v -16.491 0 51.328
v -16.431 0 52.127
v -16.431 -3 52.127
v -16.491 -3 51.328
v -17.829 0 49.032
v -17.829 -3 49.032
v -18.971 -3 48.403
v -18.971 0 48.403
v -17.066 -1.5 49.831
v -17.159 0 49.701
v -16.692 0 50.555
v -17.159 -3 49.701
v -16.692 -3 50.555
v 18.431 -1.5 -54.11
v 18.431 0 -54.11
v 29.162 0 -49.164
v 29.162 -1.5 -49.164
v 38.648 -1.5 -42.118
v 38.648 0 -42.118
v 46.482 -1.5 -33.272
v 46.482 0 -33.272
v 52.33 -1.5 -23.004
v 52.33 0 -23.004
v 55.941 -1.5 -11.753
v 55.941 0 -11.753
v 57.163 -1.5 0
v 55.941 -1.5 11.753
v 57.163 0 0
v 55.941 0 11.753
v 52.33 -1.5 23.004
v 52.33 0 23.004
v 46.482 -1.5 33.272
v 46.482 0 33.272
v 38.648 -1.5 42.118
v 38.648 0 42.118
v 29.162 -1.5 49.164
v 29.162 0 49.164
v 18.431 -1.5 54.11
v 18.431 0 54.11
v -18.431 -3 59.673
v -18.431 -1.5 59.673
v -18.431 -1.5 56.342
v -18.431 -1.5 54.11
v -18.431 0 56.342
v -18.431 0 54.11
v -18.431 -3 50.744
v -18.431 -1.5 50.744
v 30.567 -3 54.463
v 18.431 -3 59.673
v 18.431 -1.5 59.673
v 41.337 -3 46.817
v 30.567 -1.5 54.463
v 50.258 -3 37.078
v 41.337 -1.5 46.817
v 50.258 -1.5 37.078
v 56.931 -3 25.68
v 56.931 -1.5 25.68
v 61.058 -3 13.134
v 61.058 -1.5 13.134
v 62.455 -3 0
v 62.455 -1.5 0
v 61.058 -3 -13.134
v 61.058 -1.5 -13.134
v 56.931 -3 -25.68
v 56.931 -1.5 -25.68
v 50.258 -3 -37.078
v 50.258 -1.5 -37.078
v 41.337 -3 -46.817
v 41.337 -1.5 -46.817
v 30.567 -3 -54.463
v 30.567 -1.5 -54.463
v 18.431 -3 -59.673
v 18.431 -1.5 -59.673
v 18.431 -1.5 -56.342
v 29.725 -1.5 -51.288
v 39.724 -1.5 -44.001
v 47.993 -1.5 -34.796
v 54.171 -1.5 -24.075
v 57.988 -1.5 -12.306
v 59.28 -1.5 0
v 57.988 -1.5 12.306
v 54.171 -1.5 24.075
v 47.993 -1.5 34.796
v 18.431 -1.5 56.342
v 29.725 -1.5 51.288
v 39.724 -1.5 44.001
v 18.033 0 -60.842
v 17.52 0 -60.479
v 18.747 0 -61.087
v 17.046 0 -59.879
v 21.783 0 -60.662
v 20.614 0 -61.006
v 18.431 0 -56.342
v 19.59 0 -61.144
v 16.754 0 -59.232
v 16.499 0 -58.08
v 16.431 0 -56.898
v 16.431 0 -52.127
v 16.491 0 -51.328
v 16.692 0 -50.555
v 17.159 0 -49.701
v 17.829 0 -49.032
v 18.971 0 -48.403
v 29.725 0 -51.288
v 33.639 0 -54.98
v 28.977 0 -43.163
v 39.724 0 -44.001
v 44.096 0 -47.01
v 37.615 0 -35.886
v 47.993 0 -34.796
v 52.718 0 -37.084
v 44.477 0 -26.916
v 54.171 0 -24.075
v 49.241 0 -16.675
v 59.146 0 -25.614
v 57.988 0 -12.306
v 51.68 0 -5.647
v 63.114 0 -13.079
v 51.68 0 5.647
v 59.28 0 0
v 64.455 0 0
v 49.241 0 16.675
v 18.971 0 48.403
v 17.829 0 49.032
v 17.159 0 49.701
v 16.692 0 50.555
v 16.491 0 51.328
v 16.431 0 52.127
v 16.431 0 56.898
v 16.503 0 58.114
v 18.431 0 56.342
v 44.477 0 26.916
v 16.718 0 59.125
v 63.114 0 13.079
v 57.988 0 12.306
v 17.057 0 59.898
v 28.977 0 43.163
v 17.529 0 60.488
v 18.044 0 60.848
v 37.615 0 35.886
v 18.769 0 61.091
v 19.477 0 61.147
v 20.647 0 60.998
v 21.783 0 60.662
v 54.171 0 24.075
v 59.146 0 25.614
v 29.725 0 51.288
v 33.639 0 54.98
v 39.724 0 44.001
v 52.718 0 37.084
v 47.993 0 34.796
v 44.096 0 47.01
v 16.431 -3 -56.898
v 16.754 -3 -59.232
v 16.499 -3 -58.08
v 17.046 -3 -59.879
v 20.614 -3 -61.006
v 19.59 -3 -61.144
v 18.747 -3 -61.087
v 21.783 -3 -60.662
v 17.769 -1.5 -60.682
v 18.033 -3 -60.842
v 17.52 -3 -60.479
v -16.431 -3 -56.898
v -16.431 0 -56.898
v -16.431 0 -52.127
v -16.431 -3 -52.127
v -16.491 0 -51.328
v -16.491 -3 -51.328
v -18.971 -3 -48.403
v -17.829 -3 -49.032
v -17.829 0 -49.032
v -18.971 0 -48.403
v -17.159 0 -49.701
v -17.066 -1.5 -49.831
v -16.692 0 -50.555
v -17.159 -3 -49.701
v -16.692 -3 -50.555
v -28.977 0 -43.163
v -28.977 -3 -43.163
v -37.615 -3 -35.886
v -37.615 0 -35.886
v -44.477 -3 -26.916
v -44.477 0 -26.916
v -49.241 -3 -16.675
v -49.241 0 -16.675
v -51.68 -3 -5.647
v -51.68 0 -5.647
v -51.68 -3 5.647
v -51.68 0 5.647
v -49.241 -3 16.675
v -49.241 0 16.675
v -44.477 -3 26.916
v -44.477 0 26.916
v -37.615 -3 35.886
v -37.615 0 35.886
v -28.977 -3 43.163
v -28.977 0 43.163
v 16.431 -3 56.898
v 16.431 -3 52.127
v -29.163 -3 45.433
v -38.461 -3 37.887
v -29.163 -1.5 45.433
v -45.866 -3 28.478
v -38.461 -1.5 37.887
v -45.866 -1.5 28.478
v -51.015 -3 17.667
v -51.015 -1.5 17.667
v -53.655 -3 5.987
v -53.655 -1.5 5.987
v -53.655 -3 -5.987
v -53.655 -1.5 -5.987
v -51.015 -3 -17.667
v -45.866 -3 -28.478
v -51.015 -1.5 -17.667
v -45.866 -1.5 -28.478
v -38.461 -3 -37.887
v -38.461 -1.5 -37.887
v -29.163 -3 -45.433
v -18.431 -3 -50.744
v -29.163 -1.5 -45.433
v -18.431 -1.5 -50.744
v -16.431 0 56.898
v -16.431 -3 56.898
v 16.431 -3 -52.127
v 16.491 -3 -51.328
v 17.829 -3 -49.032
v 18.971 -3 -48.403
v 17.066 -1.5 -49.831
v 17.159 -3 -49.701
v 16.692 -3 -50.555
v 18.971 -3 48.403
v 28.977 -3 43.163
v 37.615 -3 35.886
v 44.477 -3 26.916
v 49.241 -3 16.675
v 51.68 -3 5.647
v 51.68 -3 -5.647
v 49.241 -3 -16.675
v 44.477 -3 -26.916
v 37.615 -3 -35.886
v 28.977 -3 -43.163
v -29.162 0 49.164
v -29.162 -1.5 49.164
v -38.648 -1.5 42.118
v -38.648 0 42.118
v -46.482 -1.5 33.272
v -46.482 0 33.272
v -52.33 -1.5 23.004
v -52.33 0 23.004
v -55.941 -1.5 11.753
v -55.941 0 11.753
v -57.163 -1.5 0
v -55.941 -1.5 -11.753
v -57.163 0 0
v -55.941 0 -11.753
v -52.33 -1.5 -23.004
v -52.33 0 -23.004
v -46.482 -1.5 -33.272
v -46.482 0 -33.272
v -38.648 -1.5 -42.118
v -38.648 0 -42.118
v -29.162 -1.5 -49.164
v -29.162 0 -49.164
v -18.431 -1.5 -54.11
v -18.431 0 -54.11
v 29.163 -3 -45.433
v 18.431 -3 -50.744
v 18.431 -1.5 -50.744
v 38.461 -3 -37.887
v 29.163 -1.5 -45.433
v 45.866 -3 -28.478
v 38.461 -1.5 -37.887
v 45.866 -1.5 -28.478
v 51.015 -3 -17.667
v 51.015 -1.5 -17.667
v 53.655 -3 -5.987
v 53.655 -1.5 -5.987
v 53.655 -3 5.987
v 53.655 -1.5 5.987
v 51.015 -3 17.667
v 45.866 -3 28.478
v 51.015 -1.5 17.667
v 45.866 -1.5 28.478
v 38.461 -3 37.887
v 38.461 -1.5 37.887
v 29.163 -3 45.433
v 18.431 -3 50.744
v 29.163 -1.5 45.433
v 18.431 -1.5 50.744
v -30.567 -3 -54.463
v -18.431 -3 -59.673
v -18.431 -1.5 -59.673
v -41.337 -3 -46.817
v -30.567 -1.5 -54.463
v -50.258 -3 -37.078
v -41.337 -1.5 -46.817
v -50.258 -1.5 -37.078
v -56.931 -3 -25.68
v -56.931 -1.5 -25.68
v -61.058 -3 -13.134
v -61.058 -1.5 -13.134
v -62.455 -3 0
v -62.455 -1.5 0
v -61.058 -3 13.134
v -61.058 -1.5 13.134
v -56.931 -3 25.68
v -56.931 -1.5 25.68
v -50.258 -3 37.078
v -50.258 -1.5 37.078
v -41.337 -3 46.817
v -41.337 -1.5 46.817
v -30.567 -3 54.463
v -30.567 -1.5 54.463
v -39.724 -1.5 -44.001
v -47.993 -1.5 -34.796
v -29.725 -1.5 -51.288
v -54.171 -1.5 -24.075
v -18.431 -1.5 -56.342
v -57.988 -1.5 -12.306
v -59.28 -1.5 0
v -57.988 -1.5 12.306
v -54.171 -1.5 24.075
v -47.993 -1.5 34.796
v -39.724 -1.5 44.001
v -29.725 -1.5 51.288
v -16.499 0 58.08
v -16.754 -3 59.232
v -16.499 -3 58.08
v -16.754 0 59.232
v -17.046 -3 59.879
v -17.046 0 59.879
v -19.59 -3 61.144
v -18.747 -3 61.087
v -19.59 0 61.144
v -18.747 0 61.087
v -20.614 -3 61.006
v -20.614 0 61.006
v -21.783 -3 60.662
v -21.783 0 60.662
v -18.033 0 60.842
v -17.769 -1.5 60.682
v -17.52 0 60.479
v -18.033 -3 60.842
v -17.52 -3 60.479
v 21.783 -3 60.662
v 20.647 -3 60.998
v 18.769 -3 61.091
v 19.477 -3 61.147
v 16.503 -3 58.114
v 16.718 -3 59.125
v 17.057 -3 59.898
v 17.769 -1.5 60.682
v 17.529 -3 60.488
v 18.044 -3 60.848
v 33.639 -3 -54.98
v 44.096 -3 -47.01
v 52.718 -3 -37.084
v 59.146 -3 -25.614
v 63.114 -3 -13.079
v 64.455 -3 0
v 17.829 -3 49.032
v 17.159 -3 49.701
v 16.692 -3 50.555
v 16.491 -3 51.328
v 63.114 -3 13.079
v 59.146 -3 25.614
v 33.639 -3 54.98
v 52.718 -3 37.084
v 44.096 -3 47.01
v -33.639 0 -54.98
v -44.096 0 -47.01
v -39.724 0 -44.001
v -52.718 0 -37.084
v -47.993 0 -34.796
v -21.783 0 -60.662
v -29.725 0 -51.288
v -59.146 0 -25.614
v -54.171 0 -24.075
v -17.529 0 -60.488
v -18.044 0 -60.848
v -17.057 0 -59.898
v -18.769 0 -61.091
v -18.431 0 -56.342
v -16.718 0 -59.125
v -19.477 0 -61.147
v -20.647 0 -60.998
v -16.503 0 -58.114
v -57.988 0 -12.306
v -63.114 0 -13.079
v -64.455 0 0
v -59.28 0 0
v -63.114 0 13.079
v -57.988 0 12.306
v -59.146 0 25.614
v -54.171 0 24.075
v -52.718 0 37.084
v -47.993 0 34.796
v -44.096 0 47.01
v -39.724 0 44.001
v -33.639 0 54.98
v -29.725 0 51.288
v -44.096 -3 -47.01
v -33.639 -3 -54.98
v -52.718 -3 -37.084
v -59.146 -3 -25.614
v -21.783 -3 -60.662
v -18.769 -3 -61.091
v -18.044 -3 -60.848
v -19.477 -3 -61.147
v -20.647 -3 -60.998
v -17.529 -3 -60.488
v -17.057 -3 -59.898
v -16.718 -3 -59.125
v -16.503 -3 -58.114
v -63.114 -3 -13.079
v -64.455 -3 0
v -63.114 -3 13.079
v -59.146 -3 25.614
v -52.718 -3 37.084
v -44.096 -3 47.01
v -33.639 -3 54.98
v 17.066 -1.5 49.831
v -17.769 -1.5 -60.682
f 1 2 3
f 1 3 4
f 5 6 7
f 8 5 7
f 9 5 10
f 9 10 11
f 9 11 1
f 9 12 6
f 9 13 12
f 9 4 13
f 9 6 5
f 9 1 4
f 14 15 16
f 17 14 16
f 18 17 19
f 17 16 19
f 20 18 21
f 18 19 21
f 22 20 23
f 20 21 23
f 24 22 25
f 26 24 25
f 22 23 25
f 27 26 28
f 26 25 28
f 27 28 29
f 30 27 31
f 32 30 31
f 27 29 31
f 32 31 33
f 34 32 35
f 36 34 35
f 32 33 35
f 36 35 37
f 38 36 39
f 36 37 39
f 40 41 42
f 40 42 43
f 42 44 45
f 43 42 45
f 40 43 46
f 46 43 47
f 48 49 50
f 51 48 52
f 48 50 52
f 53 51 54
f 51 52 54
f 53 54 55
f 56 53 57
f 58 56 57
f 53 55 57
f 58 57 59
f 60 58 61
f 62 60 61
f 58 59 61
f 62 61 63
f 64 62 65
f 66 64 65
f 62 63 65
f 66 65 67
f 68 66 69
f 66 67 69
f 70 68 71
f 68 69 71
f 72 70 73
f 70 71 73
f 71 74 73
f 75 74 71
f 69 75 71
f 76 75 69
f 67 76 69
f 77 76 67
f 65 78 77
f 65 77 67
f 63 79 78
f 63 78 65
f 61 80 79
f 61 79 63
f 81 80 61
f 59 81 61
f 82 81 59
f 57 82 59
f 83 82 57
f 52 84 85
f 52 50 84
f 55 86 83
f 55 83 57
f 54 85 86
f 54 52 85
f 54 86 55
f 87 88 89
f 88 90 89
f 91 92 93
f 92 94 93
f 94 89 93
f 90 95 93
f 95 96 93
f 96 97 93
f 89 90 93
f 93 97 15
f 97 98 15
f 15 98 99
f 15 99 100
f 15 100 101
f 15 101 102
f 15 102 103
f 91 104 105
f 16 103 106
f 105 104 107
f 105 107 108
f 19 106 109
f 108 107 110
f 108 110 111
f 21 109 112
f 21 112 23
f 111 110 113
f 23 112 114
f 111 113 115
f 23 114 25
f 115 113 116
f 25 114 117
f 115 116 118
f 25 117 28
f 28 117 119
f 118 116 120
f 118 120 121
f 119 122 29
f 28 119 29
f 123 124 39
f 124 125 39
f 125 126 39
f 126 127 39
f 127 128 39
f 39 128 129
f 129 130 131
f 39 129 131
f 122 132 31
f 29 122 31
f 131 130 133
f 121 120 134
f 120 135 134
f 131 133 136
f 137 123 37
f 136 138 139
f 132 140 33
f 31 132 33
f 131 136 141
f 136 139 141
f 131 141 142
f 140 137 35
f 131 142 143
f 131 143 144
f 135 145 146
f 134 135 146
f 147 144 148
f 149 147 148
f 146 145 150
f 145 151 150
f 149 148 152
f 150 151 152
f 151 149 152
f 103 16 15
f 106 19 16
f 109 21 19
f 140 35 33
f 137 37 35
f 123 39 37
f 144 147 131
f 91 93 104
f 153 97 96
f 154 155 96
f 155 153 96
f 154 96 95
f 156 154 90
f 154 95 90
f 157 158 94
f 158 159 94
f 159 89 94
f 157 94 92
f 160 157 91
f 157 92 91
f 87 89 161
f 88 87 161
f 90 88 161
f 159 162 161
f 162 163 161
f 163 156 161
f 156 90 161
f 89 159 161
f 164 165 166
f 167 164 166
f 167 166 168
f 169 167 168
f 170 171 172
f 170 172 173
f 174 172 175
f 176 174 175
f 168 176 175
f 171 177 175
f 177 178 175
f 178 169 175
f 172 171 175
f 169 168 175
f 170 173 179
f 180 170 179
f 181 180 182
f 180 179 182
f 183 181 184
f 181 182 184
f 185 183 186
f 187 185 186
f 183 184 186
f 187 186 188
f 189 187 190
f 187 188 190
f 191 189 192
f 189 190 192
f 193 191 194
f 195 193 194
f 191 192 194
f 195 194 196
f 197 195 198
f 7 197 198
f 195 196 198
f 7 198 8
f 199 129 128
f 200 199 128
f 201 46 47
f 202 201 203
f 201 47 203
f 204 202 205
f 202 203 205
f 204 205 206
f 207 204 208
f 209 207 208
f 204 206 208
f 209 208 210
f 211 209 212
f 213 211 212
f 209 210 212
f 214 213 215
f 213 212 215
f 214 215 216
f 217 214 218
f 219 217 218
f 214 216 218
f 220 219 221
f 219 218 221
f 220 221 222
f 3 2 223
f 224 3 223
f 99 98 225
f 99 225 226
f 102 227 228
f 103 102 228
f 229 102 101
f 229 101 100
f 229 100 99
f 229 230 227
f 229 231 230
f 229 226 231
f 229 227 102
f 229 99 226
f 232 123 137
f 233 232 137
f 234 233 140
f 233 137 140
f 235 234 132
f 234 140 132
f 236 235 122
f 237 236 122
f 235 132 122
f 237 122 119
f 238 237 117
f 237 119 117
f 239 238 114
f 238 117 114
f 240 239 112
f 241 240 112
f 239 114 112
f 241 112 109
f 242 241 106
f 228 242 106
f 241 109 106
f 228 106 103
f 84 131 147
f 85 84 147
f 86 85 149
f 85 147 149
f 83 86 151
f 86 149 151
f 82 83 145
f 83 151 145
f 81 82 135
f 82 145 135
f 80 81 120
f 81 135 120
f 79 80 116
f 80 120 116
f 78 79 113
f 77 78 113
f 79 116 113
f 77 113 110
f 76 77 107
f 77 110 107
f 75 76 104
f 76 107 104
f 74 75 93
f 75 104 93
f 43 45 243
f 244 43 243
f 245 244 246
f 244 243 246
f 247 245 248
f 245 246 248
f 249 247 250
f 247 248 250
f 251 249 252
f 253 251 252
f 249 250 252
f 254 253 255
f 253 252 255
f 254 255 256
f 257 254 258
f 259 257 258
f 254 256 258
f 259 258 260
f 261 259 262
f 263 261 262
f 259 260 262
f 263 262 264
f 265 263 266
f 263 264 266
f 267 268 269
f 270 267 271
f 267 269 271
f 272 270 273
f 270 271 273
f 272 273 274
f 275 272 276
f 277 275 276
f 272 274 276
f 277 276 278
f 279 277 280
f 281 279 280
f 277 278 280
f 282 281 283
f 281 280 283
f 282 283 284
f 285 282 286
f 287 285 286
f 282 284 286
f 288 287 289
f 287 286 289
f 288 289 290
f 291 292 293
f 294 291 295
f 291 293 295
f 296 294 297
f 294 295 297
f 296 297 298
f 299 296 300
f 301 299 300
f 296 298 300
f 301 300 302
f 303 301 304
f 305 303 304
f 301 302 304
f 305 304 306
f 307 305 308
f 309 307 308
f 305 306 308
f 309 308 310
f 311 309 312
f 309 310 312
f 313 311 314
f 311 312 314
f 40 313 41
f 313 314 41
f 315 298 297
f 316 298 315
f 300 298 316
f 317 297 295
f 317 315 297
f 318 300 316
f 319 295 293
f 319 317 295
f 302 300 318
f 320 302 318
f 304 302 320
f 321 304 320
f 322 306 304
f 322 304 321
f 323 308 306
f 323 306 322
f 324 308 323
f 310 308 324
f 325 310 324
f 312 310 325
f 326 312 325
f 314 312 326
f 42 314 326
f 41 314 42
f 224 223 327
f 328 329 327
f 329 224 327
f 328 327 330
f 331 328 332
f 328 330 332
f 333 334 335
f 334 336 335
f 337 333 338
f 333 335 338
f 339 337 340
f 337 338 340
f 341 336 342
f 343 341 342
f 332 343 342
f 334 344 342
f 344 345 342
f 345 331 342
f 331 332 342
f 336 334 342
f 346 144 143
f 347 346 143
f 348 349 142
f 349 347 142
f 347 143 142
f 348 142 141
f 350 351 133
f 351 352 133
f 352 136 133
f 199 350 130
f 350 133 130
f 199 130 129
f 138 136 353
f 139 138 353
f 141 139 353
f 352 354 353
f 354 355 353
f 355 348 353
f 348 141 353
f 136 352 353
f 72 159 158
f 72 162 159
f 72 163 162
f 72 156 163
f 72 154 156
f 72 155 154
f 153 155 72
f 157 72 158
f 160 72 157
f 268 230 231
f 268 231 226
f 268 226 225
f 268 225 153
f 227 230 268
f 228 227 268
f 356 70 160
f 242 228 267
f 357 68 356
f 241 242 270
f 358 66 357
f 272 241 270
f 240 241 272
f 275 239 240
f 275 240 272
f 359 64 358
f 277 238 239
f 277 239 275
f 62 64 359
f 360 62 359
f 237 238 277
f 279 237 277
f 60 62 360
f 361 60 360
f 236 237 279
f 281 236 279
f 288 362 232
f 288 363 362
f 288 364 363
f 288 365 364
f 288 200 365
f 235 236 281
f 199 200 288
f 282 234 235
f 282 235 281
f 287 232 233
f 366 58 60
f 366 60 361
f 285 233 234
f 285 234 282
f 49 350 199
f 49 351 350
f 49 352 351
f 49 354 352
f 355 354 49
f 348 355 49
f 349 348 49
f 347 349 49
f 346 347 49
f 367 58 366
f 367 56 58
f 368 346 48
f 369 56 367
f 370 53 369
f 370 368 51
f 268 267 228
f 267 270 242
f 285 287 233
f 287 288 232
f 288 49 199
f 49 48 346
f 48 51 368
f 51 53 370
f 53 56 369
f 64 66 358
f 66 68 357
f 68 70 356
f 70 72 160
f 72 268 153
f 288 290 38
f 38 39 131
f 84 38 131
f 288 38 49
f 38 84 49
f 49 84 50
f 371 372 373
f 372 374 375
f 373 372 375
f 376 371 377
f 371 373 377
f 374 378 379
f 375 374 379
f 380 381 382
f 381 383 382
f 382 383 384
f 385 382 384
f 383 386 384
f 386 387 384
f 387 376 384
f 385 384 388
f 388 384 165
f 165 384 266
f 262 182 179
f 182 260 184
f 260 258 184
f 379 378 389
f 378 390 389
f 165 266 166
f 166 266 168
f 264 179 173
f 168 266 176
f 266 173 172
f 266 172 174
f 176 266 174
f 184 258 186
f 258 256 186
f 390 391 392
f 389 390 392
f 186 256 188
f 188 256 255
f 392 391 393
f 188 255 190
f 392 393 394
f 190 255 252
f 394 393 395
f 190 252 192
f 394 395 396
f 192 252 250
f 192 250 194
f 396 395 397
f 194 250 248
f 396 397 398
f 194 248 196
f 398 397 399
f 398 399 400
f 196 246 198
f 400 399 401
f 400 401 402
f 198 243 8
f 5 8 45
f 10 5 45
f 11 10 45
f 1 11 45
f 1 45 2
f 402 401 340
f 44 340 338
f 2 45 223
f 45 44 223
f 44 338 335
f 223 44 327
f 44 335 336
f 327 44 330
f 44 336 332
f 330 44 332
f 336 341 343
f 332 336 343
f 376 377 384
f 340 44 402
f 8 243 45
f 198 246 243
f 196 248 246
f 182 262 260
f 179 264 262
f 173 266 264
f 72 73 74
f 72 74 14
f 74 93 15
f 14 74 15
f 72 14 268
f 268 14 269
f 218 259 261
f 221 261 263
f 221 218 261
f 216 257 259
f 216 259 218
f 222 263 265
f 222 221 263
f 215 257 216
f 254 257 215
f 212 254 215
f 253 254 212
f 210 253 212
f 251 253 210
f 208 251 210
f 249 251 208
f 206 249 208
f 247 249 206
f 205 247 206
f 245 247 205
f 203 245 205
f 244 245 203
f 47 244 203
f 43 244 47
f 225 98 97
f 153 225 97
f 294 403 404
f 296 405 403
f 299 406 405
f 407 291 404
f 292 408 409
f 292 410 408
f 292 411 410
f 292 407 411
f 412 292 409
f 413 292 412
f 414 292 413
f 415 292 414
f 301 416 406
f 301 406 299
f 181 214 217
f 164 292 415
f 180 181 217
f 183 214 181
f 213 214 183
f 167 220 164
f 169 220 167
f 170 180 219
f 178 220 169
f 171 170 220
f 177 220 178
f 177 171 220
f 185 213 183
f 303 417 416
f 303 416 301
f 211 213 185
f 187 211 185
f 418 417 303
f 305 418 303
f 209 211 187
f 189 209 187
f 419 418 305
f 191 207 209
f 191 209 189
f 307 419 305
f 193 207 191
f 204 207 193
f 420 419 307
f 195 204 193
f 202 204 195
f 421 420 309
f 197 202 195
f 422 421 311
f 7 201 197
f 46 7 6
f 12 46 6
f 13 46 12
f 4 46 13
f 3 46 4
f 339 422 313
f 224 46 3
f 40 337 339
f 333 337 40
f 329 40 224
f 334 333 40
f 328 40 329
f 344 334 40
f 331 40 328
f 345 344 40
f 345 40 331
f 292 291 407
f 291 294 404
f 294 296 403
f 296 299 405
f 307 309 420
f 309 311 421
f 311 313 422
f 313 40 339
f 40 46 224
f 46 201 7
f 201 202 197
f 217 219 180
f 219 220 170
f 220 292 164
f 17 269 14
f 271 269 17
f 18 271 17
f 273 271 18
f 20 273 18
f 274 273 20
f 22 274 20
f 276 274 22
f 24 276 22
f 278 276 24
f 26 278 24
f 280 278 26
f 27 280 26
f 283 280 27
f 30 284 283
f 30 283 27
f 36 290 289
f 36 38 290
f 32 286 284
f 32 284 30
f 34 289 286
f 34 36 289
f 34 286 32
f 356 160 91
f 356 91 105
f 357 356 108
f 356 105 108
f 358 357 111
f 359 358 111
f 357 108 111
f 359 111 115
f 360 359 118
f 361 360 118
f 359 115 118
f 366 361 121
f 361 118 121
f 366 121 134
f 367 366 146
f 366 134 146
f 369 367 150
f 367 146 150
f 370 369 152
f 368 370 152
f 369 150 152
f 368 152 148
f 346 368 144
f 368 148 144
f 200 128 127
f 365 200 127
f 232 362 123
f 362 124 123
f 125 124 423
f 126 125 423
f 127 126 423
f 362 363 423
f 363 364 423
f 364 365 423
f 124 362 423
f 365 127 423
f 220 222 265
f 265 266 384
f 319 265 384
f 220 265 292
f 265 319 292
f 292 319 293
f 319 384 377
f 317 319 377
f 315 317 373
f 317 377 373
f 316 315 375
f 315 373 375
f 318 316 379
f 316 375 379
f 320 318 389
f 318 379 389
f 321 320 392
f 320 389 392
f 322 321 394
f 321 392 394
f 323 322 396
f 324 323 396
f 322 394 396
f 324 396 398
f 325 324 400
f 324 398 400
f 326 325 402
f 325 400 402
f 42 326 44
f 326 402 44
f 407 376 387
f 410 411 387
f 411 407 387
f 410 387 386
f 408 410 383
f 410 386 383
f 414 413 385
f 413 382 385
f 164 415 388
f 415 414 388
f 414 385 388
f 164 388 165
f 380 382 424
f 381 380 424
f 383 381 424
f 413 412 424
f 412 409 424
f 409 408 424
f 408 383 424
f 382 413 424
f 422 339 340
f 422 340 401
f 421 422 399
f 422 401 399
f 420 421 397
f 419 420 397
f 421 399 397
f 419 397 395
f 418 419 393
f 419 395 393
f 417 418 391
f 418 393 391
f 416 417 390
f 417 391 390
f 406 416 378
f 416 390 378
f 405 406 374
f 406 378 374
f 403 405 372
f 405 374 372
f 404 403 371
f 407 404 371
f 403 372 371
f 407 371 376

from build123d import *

# Parameters (mm, degrees)
F1_DEPTH      = 1.5
F2_DEPTH      = 3
F3_T1_DEPTH   = 31.0210256648
F3_T3_DEPTH   = 17.0194710076
F3_2_T1_DEPTH = 31.0210256648
F3_2_T3_DEPTH = 17.0194710075


# Not quite as in the source:
# - a fillet or chamfer that OpenCascade refuses, or shapes differently, is made with other operations: its cross-section is extruded or revolved along the edge and cut away or added


with BuildPart() as f1:
    # F0 (on Front) → F1 (new body)
    with BuildSketch(Plane.XZ):
        with BuildLine():
            ThreePointArc((-18.4309218526, 56.3415860789), (-17.4336374643, 56.6581105137), (-16.4309218526, 56.95698385))
            Line((-16.4309218526, 56.95698385), (-16.4309218526, 60.2544953802))
            ThreePointArc((-16.4309218526, 60.2544953802), (-17.433345569, 59.972142439), (-18.4309218526, 59.6731139301))
            Line((-18.4309218526, 59.6731139301), (-18.4309218526, 56.3415860789))
        make_face()
        with BuildLine():
            ThreePointArc((-18.4309218526, -56.3415860789), (-59.2796187759, 0), (-18.4309218526, 56.3415860789))
            Line((-18.4309218526, 56.3415860789), (-18.4309218526, 59.6731139301))
            ThreePointArc((-18.4309218526, 59.6731139301), (-62.4546187759, 0), (-18.4309218526, -59.6731139301))
            Line((-18.4309218526, -59.6731139301), (-18.4309218526, -56.3415860789))
        make_face()
        with BuildLine():
            ThreePointArc((-16.4309218526, -56.95698385), (-17.4336374643, -56.6581105137), (-18.4309218526, -56.3415860789))
            Line((-18.4309218526, -56.3415860789), (-18.4309218526, -59.6731139301))
            ThreePointArc((-18.4309218526, -59.6731139301), (-17.433345569, -59.972142439), (-16.4309218526, -60.2544953802))
            Line((-16.4309218526, -60.2544953802), (-16.4309218526, -56.95698385))
        make_face()
    extrude(amount=F1_DEPTH)



with BuildPart() as f1b:
    # F0 (on Front) → F1, piece 2 (new body)
    with BuildSketch(Plane.XZ):
        with BuildLine():
            ThreePointArc((-18.4309218526, 50.7441040985), (-17.4342611615, 51.0951026895), (-16.4309218526, 51.4265280587))
            Line((-16.4309218526, 51.4265280587), (-16.4309218526, 54.7502492451))
            ThreePointArc((-16.4309218526, 54.7502492451), (-17.4338634076, 54.4391898544), (-18.4309218526, 54.1097597942))
            Line((-18.4309218526, 54.1097597942), (-18.4309218526, 50.7441040985))
        make_face()
        with BuildLine():
            ThreePointArc((-18.4309218526, -50.7441040985), (-53.9876187759, 0), (-18.4309218526, 50.7441040985))
            Line((-18.4309218526, 50.7441040985), (-18.4309218526, 54.1097597942))
            ThreePointArc((-18.4309218526, 54.1097597942), (-57.1626187759, 0), (-18.4309218526, -54.1097597942))
            Line((-18.4309218526, -54.1097597942), (-18.4309218526, -50.7441040985))
        make_face()
        with BuildLine():
            ThreePointArc((-16.4309218526, -51.4265280587), (-17.4342611615, -51.0951026895), (-18.4309218526, -50.7441040985))
            Line((-18.4309218526, -50.7441040985), (-18.4309218526, -54.1097597942))
            ThreePointArc((-18.4309218526, -54.1097597942), (-17.4338634076, -54.4391898544), (-16.4309218526, -54.7502492451))
            Line((-16.4309218526, -54.7502492451), (-16.4309218526, -51.4265280587))
        make_face()
    extrude(amount=F1_DEPTH)


with BuildPart() as f1c:
    # F0 (on Front) → F1, piece 3 (new body)
    with BuildSketch(Plane.XZ):
        with BuildLine():
            ThreePointArc((18.4309218526, -56.3415860789), (17.4336374643, -56.6581105137), (16.4309218526, -56.95698385))
            Line((16.4309218526, -56.95698385), (16.4309218526, -60.2544953802))
            ThreePointArc((16.4309218526, -60.2544953802), (17.433345569, -59.972142439), (18.4309218526, -59.6731139301))
            Line((18.4309218526, -59.6731139301), (18.4309218526, -56.3415860789))
        make_face()
        with BuildLine():
            ThreePointArc((18.4309218526, 56.3415860789), (59.2796187759, 0), (18.4309218526, -56.3415860789))
            Line((18.4309218526, -56.3415860789), (18.4309218526, -59.6731139301))
            ThreePointArc((18.4309218526, -59.6731139301), (62.4546187759, 0), (18.4309218526, 59.6731139301))
            Line((18.4309218526, 59.6731139301), (18.4309218526, 56.3415860789))
        make_face()
        with BuildLine():
            ThreePointArc((16.4309218526, 56.95698385), (17.4336374643, 56.6581105137), (18.4309218526, 56.3415860789))
            Line((18.4309218526, 56.3415860789), (18.4309218526, 59.6731139301))
            ThreePointArc((18.4309218526, 59.6731139301), (17.433345569, 59.972142439), (16.4309218526, 60.2544953802))
            Line((16.4309218526, 60.2544953802), (16.4309218526, 56.95698385))
        make_face()
    extrude(amount=F1_DEPTH)



with BuildPart() as f1d:
    # F0 (on Front) → F1, piece 4 (new body)
    with BuildSketch(Plane.XZ):
        with BuildLine():
            ThreePointArc((18.4309218526, -50.7441040985), (17.4342611615, -51.0951026895), (16.4309218526, -51.4265280587))
            Line((16.4309218526, -51.4265280587), (16.4309218526, -54.7502492451))
            ThreePointArc((16.4309218526, -54.7502492451), (17.4338634076, -54.4391898544), (18.4309218526, -54.1097597942))
            Line((18.4309218526, -54.1097597942), (18.4309218526, -50.7441040985))
        make_face()
        with BuildLine():
            ThreePointArc((18.4309218526, 50.7441040985), (53.9876187759, 0), (18.4309218526, -50.7441040985))
            Line((18.4309218526, -50.7441040985), (18.4309218526, -54.1097597942))
            ThreePointArc((18.4309218526, -54.1097597942), (57.1626187759, 0), (18.4309218526, 54.1097597942))
            Line((18.4309218526, 54.1097597942), (18.4309218526, 50.7441040985))
        make_face()
        with BuildLine():
            ThreePointArc((16.4309218526, 51.4265280587), (17.4342611615, 51.0951026895), (18.4309218526, 50.7441040985))
            Line((18.4309218526, 50.7441040985), (18.4309218526, 54.1097597942))
            ThreePointArc((18.4309218526, 54.1097597942), (17.4338634076, 54.4391898544), (16.4309218526, 54.7502492451))
            Line((16.4309218526, 54.7502492451), (16.4309218526, 51.4265280587))
        make_face()
    extrude(amount=F1_DEPTH)


with BuildPart() as f1_1:
    add(f1.part)

    add(f1b.part)  # F2 merges F1b
    # F0 (on Front) → F2 (join)
    with BuildSketch(Plane.XZ):
        with BuildLine():
            ThreePointArc((-18.4309218526, 59.6731139301), (-17.433345569, 59.972142439), (-16.4309218526, 60.2544953802))
            Line((-16.4309218526, 60.2544953802), (-16.4309218526, 62.3251368921))
            ThreePointArc((-16.4309218526, 62.3251368921), (-17.4331857663, 62.0522514949), (-18.4309218526, 61.7632496005))
            Line((-18.4309218526, 61.7632496005), (-18.4309218526, 59.6731139301))
        make_face()
        with BuildLine():
            ThreePointArc((-18.4309218526, -59.6731139301), (-62.4546187759, 0), (-18.4309218526, 59.6731139301))
            Line((-18.4309218526, 59.6731139301), (-18.4309218526, 61.7632496005))
            ThreePointArc((-18.4309218526, 61.7632496005), (-64.4546187759, 0), (-18.4309218526, -61.7632496005))
            Line((-18.4309218526, -61.7632496005), (-18.4309218526, -59.6731139301))
        make_face()
        with BuildLine():
            ThreePointArc((-16.4309218526, -60.2544953802), (-17.433345569, -59.972142439), (-18.4309218526, -59.6731139301))
            Line((-18.4309218526, -59.6731139301), (-18.4309218526, -61.7632496005))
            ThreePointArc((-18.4309218526, -61.7632496005), (-17.4331857663, -62.0522514949), (-16.4309218526, -62.3251368921))
            Line((-16.4309218526, -62.3251368921), (-16.4309218526, -60.2544953802))
        make_face()
        with BuildLine():
            Line((-16.4309218526, 49.3227869556), (-16.4309218526, 51.4265280587))
            ThreePointArc((-16.4309218526, 51.4265280587), (-17.4342611615, 51.0951026895), (-18.4309218526, 50.7441040985))
            Line((-18.4309218526, 50.7441040985), (-18.4309218526, 48.6108385615))
            ThreePointArc((-18.4309218526, 48.6108385615), (-17.4345563253, 48.9770226916), (-16.4309218526, 49.3227869556))
        make_face()
        with BuildLine():
            Line((-18.4309218526, 48.6108385615), (-18.4309218526, 50.7441040985))
            ThreePointArc((-18.4309218526, 50.7441040985), (-53.9876187759, 0), (-18.4309218526, -50.7441040985))
            Line((-18.4309218526, -50.7441040985), (-18.4309218526, -48.6108385615))
            ThreePointArc((-18.4309218526, -48.6108385615), (-51.9876187759, 0), (-18.4309218526, 48.6108385615))
        make_face()
        with BuildLine():
            Line((-18.4309218526, -48.6108385615), (-18.4309218526, -50.7441040985))
            ThreePointArc((-18.4309218526, -50.7441040985), (-17.4342611615, -51.0951026895), (-16.4309218526, -51.4265280587))
            Line((-16.4309218526, -51.4265280587), (-16.4309218526, -49.3227869556))
            ThreePointArc((-16.4309218526, -49.3227869556), (-17.4345563253, -48.9770226916), (-18.4309218526, -48.6108385615))
        make_face()
        with BuildLine():
            ThreePointArc((-18.4309218526, 54.1097597942), (-17.4338634076, 54.4391898544), (-16.4309218526, 54.7502492451))
            Line((-16.4309218526, 54.7502492451), (-16.4309218526, 56.95698385))
            ThreePointArc((-16.4309218526, 56.95698385), (-17.4336374643, 56.6581105137), (-18.4309218526, 56.3415860789))
            Line((-18.4309218526, 56.3415860789), (-18.4309218526, 54.1097597942))
        make_face()
        with BuildLine():
            ThreePointArc((-18.4309218526, 50.7441040985), (-17.4342611615, 51.0951026895), (-16.4309218526, 51.4265280587))
            Line((-16.4309218526, 51.4265280587), (-16.4309218526, 54.7502492451))
            ThreePointArc((-16.4309218526, 54.7502492451), (-17.4338634076, 54.4391898544), (-18.4309218526, 54.1097597942))
            Line((-18.4309218526, 54.1097597942), (-18.4309218526, 50.7441040985))
        make_face()
        with BuildLine():
            ThreePointArc((-18.4309218526, 56.3415860789), (-17.4336374643, 56.6581105137), (-16.4309218526, 56.95698385))
            Line((-16.4309218526, 56.95698385), (-16.4309218526, 60.2544953802))
            ThreePointArc((-16.4309218526, 60.2544953802), (-17.433345569, 59.972142439), (-18.4309218526, 59.6731139301))
            Line((-18.4309218526, 59.6731139301), (-18.4309218526, 56.3415860789))
        make_face()
        with BuildLine():
            ThreePointArc((-16.4309218526, -51.4265280587), (-17.4342611615, -51.0951026895), (-18.4309218526, -50.7441040985))
            Line((-18.4309218526, -50.7441040985), (-18.4309218526, -54.1097597942))
            ThreePointArc((-18.4309218526, -54.1097597942), (-17.4338634076, -54.4391898544), (-16.4309218526, -54.7502492451))
            Line((-16.4309218526, -54.7502492451), (-16.4309218526, -51.4265280587))
        make_face()
        with BuildLine():
            ThreePointArc((-16.4309218526, -54.7502492451), (-17.4338634076, -54.4391898544), (-18.4309218526, -54.1097597942))
            Line((-18.4309218526, -54.1097597942), (-18.4309218526, -56.3415860789))
            ThreePointArc((-18.4309218526, -56.3415860789), (-17.4336374643, -56.6581105137), (-16.4309218526, -56.95698385))
            Line((-16.4309218526, -56.95698385), (-16.4309218526, -54.7502492451))
        make_face()
        with BuildLine():
            ThreePointArc((-16.4309218526, -56.95698385), (-17.4336374643, -56.6581105137), (-18.4309218526, -56.3415860789))
            Line((-18.4309218526, -56.3415860789), (-18.4309218526, -59.6731139301))
            ThreePointArc((-18.4309218526, -59.6731139301), (-17.433345569, -59.972142439), (-16.4309218526, -60.2544953802))
            Line((-16.4309218526, -60.2544953802), (-16.4309218526, -56.95698385))
        make_face()
    extrude(amount=F2_DEPTH)

    # F3#2: fillet of radius 4 on 4 edges, made by hand

    # F3_2_s2 → F3_2_t1 (cut)
    with BuildSketch(Plane.XZ.offset(-14.0105128324)):
        with BuildLine():
            add(Edge.make_bspline(
                [(-21.7827406063, -60.6622625133), (-16.4309218526, -62.5840055353), (-16.4309218526, -56.8976129869)],
                knots=[0, 0, 0, 1, 1, 1], degree=2, weights=[1, 1, 1]))
            Line((-16.4309218526, -56.8976129869), (-16.4309218526, -62.3251368921))
            ThreePointArc((-16.4309218526, -62.3251368921), (-19.1249127431, -61.5518935056), (-21.7827406063, -60.6622625133))
        make_face()
        with BuildLine():
            add(Edge.make_bspline(
                [(-16.4309218526, 56.8976129868), (-16.4309218526, 62.5840055353), (-21.7827406063, 60.6622625133)],
                knots=[0, 0, 0, 1, 1, 1], degree=2, weights=[1, 1, 1]))
            ThreePointArc((-21.7827406063, 60.6622625133), (-19.1249127431, 61.5518935056), (-16.4309218526, 62.3251368921))
            Line((-16.4309218526, 62.3251368921), (-16.4309218526, 56.8976129868))
        make_face()
    extrude(amount=F3_2_T1_DEPTH, mode=Mode.SUBTRACT)

    # F3_2_s4 → F3_2_t3 (cut)
    with BuildSketch(Plane.XZ.offset(-7.0097355038)):
        with BuildLine():
            add(Edge.make_bspline(
                [(-16.4309218526, -52.1266811571), (-16.4309218526, -49.3981976907), (-18.9712475675, -48.4025234024)],
                knots=[0, 0, 0, 1, 1, 1], degree=2, weights=[1, 1, 1]))
            ThreePointArc((-18.9712475675, -48.4025234024), (-17.7070641599, -48.8791610487), (-16.4309218526, -49.3227869556))
            Line((-16.4309218526, -49.3227869556), (-16.4309218526, -52.1266811571))
        make_face()
        with BuildLine():
            add(Edge.make_bspline(
                [(-16.4309218526, 52.1266811571), (-16.4309218526, 49.3981976907), (-18.9712475675, 48.4025234025)],
                knots=[0, 0, 0, 1, 1, 1], degree=2, weights=[1, 1, 1]))
            ThreePointArc((-18.9712475675, 48.4025234025), (-17.7070641599, 48.8791610487), (-16.4309218526, 49.3227869556))
            Line((-16.4309218526, 49.3227869556), (-16.4309218526, 52.1266811571))
        make_face()
    extrude(amount=F3_2_T3_DEPTH, mode=Mode.SUBTRACT)


with BuildPart() as f1c_1:
    add(f1c.part)

    add(f1d.part)  # F2#2 merges F1d
    # F0 (on Front) → F2, piece 2 (join)
    with BuildSketch(Plane.XZ):
        with BuildLine():
            Line((16.4309218526, -49.3227869556), (16.4309218526, -51.4265280587))
            ThreePointArc((16.4309218526, -51.4265280587), (17.4342611615, -51.0951026895), (18.4309218526, -50.7441040985))
            Line((18.4309218526, -50.7441040985), (18.4309218526, -48.6108385615))
            ThreePointArc((18.4309218526, -48.6108385615), (17.4345563253, -48.9770226916), (16.4309218526, -49.3227869556))
        make_face()
        with BuildLine():
            Line((18.4309218526, -48.6108385615), (18.4309218526, -50.7441040985))
            ThreePointArc((18.4309218526, -50.7441040985), (53.9876187759, 0), (18.4309218526, 50.7441040985))
            Line((18.4309218526, 50.7441040985), (18.4309218526, 48.6108385615))
            ThreePointArc((18.4309218526, 48.6108385615), (51.9876187759, 0), (18.4309218526, -48.6108385615))
        make_face()
        with BuildLine():
            Line((18.4309218526, 48.6108385615), (18.4309218526, 50.7441040985))
            ThreePointArc((18.4309218526, 50.7441040985), (17.4342611615, 51.0951026895), (16.4309218526, 51.4265280587))
            Line((16.4309218526, 51.4265280587), (16.4309218526, 49.3227869556))
            ThreePointArc((16.4309218526, 49.3227869556), (17.4345563253, 48.9770226916), (18.4309218526, 48.6108385615))
        make_face()
        with BuildLine():
            ThreePointArc((18.4309218526, -59.6731139301), (17.433345569, -59.972142439), (16.4309218526, -60.2544953802))
            Line((16.4309218526, -60.2544953802), (16.4309218526, -62.3251368921))
            ThreePointArc((16.4309218526, -62.3251368921), (17.4331857663, -62.0522514949), (18.4309218526, -61.7632496005))
            Line((18.4309218526, -61.7632496005), (18.4309218526, -59.6731139301))
        make_face()
        with BuildLine():
            ThreePointArc((18.4309218526, 59.6731139301), (62.4546187759, 0), (18.4309218526, -59.6731139301))
            Line((18.4309218526, -59.6731139301), (18.4309218526, -61.7632496005))
            ThreePointArc((18.4309218526, -61.7632496005), (64.4546187759, 0), (18.4309218526, 61.7632496005))
            Line((18.4309218526, 61.7632496005), (18.4309218526, 59.6731139301))
        make_face()
        with BuildLine():
            ThreePointArc((16.4309218526, 60.2544953802), (17.433345569, 59.972142439), (18.4309218526, 59.6731139301))
            Line((18.4309218526, 59.6731139301), (18.4309218526, 61.7632496005))
            ThreePointArc((18.4309218526, 61.7632496005), (17.4331857663, 62.0522514949), (16.4309218526, 62.3251368921))
            Line((16.4309218526, 62.3251368921), (16.4309218526, 60.2544953802))
        make_face()
        with BuildLine():
            ThreePointArc((16.4309218526, 54.7502492451), (17.4338634076, 54.4391898544), (18.4309218526, 54.1097597942))
            Line((18.4309218526, 54.1097597942), (18.4309218526, 56.3415860789))
            ThreePointArc((18.4309218526, 56.3415860789), (17.4336374643, 56.6581105137), (16.4309218526, 56.95698385))
            Line((16.4309218526, 56.95698385), (16.4309218526, 54.7502492451))
        make_face()
        with BuildLine():
            ThreePointArc((16.4309218526, 56.95698385), (17.4336374643, 56.6581105137), (18.4309218526, 56.3415860789))
            Line((18.4309218526, 56.3415860789), (18.4309218526, 59.6731139301))
            ThreePointArc((18.4309218526, 59.6731139301), (17.433345569, 59.972142439), (16.4309218526, 60.2544953802))
            Line((16.4309218526, 60.2544953802), (16.4309218526, 56.95698385))
        make_face()
        with BuildLine():
            ThreePointArc((16.4309218526, 51.4265280587), (17.4342611615, 51.0951026895), (18.4309218526, 50.7441040985))
            Line((18.4309218526, 50.7441040985), (18.4309218526, 54.1097597942))
            ThreePointArc((18.4309218526, 54.1097597942), (17.4338634076, 54.4391898544), (16.4309218526, 54.7502492451))
            Line((16.4309218526, 54.7502492451), (16.4309218526, 51.4265280587))
        make_face()
        with BuildLine():
            ThreePointArc((18.4309218526, -54.1097597942), (17.4338634076, -54.4391898544), (16.4309218526, -54.7502492451))
            Line((16.4309218526, -54.7502492451), (16.4309218526, -56.95698385))
            ThreePointArc((16.4309218526, -56.95698385), (17.4336374643, -56.6581105137), (18.4309218526, -56.3415860789))
            Line((18.4309218526, -56.3415860789), (18.4309218526, -54.1097597942))
        make_face()
        with BuildLine():
            ThreePointArc((18.4309218526, -50.7441040985), (17.4342611615, -51.0951026895), (16.4309218526, -51.4265280587))
            Line((16.4309218526, -51.4265280587), (16.4309218526, -54.7502492451))
            ThreePointArc((16.4309218526, -54.7502492451), (17.4338634076, -54.4391898544), (18.4309218526, -54.1097597942))
            Line((18.4309218526, -54.1097597942), (18.4309218526, -50.7441040985))
        make_face()
        with BuildLine():
            ThreePointArc((18.4309218526, -56.3415860789), (17.4336374643, -56.6581105137), (16.4309218526, -56.95698385))
            Line((16.4309218526, -56.95698385), (16.4309218526, -60.2544953802))
            ThreePointArc((16.4309218526, -60.2544953802), (17.433345569, -59.972142439), (18.4309218526, -59.6731139301))
            Line((18.4309218526, -59.6731139301), (18.4309218526, -56.3415860789))
        make_face()
    extrude(amount=F2_DEPTH)

    # F3: fillet of radius 4 on 4 edges, made by hand

    # F3_s2 → F3_t1 (cut)
    with BuildSketch(Plane.XZ.offset(-14.0105128324)):
        with BuildLine():
            add(Edge.make_bspline(
                [(21.7827406063, 60.6622625134), (16.4309218526, 62.5840055354), (16.4309218526, 56.8976129869)],
                knots=[0, 0, 0, 1, 1, 1], degree=2, weights=[1, 1, 1]))
            Line((16.4309218526, 56.8976129869), (16.4309218526, 62.3251368921))
            ThreePointArc((16.4309218526, 62.3251368921), (19.1249127431, 61.5518935056), (21.7827406063, 60.6622625134))
        make_face()
        with BuildLine():
            add(Edge.make_bspline(
                [(16.4309218526, -56.8976129868), (16.4309218526, -62.5840055353), (21.7827406063, -60.6622625133)],
                knots=[0, 0, 0, 1, 1, 1], degree=2, weights=[1, 1, 1]))
            ThreePointArc((21.7827406063, -60.6622625133), (19.1249127431, -61.5518935056), (16.4309218526, -62.3251368921))
            Line((16.4309218526, -62.3251368921), (16.4309218526, -56.8976129868))
        make_face()
    extrude(amount=F3_T1_DEPTH, mode=Mode.SUBTRACT)

    # F3_s4 → F3_t3 (cut)
    with BuildSketch(Plane.XZ.offset(-7.0097355038)):
        with BuildLine():
            add(Edge.make_bspline(
                [(16.4309218526, -52.1266811571), (16.4309218526, -49.3981976907), (18.9712475675, -48.4025234025)],
                knots=[0, 0, 0, 1, 1, 1], degree=2, weights=[1, 1, 1]))
            ThreePointArc((18.9712475675, -48.4025234025), (17.7070641599, -48.8791610487), (16.4309218526, -49.3227869556))
            Line((16.4309218526, -49.3227869556), (16.4309218526, -52.1266811571))
        make_face()
        with BuildLine():
            add(Edge.make_bspline(
                [(16.4309218526, 52.1266811571), (16.4309218526, 49.3981976907), (18.9712475675, 48.4025234024)],
                knots=[0, 0, 0, 1, 1, 1], degree=2, weights=[1, 1, 1]))
            ThreePointArc((18.9712475675, 48.4025234024), (17.7070641599, 48.8791610487), (16.4309218526, 49.3227869556))
            Line((16.4309218526, 49.3227869556), (16.4309218526, 52.1266811571))
        make_face()
    extrude(amount=F3_T3_DEPTH, mode=Mode.SUBTRACT)


solid = Compound([f1_1.part, f1c_1.part])
